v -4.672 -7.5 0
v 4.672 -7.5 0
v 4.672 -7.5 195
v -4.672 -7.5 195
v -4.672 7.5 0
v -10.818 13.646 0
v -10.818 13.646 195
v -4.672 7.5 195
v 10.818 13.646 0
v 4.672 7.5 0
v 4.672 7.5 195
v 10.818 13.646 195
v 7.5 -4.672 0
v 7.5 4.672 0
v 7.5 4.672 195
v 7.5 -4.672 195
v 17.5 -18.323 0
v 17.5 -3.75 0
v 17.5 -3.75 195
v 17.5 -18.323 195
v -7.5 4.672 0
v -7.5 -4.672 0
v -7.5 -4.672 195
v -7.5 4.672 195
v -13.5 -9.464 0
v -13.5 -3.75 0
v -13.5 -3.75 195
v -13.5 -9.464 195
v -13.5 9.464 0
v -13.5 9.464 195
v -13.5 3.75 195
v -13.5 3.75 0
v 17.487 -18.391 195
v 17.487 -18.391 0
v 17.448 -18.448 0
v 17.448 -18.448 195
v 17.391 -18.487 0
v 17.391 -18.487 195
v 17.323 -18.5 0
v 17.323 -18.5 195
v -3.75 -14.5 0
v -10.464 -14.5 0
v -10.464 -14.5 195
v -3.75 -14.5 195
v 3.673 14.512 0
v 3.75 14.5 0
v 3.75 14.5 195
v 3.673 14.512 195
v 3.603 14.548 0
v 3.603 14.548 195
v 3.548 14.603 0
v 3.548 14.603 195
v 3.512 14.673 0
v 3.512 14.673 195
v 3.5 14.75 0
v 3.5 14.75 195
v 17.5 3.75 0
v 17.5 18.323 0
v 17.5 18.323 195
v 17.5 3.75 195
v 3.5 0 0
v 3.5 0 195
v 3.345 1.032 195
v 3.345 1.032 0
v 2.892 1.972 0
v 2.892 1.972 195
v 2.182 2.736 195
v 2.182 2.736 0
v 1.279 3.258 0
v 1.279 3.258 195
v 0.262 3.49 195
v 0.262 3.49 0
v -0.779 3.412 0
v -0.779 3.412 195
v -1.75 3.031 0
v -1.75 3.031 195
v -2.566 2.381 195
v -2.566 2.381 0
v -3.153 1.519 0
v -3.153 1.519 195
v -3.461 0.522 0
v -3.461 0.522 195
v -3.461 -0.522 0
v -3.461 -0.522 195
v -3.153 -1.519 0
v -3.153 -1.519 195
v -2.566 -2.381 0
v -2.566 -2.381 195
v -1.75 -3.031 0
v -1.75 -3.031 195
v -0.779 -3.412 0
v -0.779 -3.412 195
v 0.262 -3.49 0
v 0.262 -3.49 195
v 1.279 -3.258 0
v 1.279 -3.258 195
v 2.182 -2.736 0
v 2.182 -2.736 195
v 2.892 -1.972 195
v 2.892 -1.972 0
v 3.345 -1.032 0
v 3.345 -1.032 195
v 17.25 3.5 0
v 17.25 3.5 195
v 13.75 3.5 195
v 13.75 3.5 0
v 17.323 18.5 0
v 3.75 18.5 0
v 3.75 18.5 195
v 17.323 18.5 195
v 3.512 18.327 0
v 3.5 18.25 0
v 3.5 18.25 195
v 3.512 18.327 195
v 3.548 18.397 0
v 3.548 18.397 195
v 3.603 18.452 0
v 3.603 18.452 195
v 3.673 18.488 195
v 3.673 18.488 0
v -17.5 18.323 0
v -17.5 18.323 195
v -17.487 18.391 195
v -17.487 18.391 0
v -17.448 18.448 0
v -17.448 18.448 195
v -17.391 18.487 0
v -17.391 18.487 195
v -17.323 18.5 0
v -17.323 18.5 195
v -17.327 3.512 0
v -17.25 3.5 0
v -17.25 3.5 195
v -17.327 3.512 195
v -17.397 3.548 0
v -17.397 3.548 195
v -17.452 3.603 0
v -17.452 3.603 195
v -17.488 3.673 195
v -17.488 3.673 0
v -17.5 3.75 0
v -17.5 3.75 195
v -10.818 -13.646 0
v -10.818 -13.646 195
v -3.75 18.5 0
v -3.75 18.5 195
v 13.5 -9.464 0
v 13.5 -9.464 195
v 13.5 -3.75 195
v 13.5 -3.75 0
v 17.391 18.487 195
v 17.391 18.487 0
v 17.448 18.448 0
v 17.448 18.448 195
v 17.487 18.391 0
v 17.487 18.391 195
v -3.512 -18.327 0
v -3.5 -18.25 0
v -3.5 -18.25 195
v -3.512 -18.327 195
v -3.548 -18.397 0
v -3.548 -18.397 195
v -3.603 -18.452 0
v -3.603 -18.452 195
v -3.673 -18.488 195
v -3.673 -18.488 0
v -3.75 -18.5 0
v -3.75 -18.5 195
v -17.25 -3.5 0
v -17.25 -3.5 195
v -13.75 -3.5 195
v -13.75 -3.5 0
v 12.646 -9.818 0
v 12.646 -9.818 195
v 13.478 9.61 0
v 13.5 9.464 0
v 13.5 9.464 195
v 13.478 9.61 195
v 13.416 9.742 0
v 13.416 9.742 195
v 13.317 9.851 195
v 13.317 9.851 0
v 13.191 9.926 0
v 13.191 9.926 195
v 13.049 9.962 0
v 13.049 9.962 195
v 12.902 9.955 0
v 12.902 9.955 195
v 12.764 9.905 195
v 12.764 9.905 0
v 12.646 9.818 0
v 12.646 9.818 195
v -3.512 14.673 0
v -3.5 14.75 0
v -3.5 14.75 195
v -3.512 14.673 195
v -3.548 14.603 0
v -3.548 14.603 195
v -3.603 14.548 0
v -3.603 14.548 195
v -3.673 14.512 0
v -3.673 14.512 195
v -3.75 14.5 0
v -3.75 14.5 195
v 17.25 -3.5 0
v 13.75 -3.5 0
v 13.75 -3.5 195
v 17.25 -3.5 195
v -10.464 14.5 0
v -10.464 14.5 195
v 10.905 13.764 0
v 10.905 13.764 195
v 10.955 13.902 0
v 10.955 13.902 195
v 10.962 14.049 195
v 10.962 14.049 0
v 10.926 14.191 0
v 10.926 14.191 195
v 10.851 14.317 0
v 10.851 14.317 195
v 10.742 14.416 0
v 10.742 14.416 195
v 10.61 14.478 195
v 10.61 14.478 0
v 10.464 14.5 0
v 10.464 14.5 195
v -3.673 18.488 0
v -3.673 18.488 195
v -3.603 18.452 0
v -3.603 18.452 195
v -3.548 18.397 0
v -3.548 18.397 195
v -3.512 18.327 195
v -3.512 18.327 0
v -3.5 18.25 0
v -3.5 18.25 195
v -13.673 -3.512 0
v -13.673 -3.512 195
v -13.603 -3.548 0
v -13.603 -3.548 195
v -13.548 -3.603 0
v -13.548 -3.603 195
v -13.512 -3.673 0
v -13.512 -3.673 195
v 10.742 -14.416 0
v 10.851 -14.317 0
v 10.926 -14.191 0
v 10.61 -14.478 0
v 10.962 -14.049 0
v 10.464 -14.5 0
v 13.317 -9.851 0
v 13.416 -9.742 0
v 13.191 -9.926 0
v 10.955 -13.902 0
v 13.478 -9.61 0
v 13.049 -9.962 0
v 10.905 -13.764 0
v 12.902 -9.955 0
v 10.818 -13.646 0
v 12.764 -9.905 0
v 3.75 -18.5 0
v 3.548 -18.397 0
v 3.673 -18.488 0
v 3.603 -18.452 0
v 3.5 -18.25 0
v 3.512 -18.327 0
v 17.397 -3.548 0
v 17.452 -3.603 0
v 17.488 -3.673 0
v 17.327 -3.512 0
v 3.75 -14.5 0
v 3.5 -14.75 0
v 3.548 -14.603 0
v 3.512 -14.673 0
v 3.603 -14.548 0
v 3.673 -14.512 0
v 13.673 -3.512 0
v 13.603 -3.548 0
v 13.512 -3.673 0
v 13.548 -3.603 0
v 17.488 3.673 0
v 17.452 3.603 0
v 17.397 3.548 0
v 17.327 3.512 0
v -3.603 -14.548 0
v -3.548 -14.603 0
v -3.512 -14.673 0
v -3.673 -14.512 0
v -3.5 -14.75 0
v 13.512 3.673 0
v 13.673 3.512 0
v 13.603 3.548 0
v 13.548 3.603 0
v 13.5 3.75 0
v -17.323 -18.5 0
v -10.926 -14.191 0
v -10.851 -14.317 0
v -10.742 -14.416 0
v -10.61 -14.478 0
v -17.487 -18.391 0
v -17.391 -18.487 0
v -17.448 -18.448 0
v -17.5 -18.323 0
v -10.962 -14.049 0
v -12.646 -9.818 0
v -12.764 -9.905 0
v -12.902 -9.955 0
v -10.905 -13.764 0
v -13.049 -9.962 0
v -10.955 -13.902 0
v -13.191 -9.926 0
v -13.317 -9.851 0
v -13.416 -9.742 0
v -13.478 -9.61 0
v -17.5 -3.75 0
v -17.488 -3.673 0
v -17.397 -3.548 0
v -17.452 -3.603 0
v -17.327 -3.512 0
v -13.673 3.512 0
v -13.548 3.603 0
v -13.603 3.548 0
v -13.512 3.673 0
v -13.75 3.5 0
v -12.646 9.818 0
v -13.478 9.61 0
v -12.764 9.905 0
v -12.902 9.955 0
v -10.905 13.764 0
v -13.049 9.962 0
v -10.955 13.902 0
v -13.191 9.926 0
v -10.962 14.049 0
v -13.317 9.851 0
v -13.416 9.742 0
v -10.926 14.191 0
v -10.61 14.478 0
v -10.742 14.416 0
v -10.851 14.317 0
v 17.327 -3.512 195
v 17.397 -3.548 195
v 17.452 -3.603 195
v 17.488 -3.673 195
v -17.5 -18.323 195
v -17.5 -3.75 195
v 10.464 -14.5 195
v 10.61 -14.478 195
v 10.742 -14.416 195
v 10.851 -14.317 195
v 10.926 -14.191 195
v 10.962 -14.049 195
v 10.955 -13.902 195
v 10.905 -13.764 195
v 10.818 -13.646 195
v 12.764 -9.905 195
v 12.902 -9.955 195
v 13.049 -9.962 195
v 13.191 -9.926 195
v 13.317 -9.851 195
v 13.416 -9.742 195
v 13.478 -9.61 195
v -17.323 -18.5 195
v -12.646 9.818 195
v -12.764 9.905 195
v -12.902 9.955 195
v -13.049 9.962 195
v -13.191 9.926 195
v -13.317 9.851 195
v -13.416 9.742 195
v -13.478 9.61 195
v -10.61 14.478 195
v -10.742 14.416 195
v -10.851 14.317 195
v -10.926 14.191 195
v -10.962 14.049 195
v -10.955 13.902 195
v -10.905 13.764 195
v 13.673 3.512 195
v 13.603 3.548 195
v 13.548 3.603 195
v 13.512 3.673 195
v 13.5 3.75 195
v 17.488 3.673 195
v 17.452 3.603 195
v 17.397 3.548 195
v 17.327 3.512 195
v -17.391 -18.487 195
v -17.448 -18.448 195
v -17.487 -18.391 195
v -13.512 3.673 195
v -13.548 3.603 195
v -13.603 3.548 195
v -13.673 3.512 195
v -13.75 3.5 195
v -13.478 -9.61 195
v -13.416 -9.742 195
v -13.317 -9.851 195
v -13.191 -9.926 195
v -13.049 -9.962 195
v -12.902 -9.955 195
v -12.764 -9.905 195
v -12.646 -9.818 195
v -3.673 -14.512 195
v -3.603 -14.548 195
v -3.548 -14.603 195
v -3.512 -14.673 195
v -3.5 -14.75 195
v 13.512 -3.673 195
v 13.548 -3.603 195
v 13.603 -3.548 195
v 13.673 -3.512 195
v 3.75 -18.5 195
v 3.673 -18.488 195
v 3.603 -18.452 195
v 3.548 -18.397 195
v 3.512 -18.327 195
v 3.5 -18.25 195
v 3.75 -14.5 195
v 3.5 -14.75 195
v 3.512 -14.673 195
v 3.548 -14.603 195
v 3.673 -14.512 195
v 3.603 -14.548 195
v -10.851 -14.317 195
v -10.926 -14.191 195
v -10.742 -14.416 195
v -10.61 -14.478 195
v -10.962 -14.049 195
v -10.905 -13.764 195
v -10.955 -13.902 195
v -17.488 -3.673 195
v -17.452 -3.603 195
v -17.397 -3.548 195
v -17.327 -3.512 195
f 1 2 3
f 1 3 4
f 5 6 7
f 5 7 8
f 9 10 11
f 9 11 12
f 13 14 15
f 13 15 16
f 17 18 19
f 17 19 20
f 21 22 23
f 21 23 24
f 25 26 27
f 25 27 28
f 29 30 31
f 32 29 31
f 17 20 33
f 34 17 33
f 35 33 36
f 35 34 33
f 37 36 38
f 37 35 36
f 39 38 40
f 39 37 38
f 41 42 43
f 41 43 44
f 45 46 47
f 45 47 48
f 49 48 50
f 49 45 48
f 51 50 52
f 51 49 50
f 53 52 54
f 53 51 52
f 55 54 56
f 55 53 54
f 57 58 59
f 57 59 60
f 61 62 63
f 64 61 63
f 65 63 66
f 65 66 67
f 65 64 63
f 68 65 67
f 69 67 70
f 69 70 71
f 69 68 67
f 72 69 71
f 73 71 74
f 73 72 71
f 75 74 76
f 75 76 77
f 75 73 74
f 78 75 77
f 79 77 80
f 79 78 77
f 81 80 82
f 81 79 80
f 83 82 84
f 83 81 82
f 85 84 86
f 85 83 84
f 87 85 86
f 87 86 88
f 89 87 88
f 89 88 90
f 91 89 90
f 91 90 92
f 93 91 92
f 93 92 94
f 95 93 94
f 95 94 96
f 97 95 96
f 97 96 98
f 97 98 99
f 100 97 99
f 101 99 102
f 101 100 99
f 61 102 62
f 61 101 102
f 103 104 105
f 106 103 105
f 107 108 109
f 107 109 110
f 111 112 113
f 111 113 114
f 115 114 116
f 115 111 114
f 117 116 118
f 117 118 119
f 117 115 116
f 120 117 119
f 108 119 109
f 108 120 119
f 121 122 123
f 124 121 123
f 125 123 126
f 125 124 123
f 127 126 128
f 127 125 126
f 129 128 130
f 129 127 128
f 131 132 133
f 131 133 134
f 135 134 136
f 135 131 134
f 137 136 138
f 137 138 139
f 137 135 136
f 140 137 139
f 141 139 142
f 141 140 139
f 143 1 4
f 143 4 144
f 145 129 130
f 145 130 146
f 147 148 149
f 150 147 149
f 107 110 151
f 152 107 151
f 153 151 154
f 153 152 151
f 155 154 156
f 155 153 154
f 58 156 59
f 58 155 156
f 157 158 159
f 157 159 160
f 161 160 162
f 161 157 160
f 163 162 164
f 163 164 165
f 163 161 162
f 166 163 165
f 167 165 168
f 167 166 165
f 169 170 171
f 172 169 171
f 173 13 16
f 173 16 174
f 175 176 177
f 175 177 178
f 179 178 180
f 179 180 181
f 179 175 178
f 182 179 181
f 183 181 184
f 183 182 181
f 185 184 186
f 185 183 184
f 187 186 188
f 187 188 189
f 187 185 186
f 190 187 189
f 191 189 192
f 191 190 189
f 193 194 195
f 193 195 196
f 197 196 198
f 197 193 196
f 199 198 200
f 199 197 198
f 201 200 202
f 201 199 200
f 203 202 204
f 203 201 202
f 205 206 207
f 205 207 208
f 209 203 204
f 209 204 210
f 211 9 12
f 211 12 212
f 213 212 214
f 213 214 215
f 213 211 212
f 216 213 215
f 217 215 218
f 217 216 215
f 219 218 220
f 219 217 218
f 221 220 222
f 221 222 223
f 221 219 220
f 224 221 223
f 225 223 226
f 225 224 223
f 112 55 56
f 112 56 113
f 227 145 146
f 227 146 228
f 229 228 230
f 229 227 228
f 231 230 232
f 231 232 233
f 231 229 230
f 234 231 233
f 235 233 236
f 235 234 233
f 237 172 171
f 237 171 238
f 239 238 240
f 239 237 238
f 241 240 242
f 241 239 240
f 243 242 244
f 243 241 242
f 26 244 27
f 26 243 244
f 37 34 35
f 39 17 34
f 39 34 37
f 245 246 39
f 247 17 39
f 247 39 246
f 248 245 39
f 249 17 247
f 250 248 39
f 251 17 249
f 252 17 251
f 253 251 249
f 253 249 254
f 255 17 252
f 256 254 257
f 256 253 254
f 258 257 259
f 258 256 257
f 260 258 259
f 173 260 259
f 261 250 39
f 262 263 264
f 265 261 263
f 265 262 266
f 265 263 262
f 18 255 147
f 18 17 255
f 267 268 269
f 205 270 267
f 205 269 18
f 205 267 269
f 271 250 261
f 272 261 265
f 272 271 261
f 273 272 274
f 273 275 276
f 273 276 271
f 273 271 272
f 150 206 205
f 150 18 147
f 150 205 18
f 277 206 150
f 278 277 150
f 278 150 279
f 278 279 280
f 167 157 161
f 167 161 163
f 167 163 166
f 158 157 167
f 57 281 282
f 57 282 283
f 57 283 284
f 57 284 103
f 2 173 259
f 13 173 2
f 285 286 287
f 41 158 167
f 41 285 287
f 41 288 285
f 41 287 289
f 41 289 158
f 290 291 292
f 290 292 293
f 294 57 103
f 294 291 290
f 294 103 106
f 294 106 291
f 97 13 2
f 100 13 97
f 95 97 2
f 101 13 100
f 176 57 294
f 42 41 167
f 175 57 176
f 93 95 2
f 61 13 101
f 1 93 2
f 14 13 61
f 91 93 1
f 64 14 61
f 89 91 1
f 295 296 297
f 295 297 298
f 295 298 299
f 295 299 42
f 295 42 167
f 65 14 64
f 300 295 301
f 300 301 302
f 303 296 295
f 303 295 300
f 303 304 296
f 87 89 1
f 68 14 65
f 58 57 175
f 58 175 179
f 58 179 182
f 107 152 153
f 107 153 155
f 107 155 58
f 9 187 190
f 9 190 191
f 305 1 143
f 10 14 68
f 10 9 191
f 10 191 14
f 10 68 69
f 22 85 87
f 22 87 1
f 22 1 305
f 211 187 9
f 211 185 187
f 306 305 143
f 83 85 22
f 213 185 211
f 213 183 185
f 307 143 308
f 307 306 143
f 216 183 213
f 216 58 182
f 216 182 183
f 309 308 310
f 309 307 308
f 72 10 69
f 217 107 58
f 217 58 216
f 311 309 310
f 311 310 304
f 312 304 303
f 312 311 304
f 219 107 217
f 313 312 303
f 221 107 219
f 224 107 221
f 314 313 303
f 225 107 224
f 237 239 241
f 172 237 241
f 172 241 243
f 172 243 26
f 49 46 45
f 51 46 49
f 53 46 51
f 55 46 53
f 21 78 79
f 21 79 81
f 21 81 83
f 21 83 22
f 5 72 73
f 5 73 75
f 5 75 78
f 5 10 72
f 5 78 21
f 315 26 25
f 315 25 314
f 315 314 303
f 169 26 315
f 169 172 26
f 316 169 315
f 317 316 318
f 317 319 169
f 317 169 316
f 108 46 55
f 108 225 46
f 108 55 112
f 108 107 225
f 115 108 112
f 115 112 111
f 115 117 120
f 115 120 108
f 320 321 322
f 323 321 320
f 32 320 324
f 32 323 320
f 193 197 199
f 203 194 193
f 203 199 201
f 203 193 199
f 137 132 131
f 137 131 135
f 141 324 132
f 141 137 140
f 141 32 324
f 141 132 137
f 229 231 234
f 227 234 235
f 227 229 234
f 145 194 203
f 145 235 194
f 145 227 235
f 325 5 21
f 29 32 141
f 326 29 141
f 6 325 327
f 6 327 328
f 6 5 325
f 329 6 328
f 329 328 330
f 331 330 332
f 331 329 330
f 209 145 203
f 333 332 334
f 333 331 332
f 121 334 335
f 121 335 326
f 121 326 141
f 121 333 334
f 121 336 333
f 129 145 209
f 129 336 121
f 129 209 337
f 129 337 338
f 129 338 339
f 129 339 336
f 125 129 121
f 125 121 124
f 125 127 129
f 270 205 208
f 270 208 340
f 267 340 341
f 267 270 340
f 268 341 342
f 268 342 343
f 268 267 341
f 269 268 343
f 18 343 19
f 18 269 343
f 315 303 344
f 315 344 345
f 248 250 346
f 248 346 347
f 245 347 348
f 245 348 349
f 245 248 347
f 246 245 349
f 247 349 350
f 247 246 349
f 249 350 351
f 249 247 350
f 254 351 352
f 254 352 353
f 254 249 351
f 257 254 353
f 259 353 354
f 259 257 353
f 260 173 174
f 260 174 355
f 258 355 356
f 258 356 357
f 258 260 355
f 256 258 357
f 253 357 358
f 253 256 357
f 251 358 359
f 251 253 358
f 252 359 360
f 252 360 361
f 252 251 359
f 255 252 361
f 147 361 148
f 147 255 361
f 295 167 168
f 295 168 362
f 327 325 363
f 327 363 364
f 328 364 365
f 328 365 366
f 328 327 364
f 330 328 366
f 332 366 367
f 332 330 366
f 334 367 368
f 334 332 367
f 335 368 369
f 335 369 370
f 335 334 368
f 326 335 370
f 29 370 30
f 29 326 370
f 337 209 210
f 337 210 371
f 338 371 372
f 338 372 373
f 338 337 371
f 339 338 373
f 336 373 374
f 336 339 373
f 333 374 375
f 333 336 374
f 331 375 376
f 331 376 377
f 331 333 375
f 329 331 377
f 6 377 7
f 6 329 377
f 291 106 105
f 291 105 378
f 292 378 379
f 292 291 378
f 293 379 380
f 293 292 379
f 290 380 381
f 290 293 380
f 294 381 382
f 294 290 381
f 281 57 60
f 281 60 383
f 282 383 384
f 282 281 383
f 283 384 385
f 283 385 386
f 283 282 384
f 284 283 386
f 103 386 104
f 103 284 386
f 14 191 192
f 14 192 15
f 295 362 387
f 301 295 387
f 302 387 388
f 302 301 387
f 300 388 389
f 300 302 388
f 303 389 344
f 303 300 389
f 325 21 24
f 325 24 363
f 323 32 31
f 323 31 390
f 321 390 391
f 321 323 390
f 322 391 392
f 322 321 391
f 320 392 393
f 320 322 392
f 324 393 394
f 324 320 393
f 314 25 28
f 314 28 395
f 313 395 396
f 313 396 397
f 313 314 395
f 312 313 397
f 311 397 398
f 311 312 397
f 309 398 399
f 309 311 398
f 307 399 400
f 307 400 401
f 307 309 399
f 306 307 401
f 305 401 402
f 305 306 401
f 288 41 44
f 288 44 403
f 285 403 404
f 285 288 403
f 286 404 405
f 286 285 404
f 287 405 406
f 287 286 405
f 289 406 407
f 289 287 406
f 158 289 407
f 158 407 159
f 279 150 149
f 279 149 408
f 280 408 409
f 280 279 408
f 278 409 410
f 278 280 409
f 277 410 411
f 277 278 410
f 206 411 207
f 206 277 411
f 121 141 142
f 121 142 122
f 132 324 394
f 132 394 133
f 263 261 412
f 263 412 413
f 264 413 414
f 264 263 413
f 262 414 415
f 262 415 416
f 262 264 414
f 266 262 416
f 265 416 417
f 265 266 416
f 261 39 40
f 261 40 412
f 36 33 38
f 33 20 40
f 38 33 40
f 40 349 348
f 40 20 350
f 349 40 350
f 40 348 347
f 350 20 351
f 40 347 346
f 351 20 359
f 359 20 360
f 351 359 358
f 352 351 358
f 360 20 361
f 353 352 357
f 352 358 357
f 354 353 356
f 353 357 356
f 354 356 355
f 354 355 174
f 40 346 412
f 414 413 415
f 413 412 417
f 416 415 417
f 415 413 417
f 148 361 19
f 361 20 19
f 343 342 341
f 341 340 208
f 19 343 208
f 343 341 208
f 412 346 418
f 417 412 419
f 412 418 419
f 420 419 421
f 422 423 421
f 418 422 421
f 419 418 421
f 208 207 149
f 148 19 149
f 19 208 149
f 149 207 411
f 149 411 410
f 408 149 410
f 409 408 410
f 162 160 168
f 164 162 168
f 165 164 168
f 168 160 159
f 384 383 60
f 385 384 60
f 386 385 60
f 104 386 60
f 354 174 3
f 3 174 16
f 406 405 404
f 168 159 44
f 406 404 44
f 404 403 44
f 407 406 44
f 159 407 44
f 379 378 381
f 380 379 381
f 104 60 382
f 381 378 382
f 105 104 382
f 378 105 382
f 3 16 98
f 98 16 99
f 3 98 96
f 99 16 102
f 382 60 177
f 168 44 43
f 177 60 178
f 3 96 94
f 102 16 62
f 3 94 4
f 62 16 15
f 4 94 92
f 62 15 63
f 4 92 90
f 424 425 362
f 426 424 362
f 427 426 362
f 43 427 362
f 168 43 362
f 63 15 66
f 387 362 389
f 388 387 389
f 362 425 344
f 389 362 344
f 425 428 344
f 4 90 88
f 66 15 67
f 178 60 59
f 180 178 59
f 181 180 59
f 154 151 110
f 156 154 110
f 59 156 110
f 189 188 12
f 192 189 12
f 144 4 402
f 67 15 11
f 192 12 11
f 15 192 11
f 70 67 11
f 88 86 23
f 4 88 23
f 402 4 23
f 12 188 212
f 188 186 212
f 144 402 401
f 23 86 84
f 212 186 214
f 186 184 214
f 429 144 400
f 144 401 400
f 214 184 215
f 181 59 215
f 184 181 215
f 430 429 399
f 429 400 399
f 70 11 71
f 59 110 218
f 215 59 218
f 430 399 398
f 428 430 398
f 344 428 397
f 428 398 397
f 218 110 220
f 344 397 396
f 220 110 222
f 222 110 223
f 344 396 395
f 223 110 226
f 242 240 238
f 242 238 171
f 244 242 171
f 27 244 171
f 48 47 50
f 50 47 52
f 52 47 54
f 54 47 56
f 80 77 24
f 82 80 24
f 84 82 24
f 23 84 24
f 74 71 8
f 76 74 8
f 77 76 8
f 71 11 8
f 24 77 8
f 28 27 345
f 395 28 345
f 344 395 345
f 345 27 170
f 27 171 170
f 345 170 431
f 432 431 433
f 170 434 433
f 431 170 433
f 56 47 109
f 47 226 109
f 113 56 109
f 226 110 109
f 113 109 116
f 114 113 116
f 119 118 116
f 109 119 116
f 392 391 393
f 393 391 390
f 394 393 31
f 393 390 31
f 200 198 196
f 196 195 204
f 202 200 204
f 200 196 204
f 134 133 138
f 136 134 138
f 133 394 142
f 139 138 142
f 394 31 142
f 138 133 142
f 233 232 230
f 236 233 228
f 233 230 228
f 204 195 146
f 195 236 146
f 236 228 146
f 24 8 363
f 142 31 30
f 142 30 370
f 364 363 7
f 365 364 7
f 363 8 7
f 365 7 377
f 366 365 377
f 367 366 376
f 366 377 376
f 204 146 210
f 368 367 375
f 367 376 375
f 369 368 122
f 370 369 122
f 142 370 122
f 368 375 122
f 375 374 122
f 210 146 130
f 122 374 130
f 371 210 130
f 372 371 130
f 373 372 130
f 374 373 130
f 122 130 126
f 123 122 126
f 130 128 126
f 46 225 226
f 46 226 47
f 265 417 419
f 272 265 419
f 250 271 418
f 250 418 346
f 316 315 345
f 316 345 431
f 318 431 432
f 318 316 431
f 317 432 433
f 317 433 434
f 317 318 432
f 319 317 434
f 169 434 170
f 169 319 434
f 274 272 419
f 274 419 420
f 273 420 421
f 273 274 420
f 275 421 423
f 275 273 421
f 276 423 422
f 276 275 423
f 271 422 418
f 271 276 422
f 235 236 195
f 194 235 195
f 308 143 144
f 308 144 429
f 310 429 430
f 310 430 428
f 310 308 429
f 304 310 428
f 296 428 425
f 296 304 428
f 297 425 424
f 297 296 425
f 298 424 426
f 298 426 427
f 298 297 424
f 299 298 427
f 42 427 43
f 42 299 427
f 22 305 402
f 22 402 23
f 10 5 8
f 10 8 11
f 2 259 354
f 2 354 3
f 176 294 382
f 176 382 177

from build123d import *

# Parameters (mm, degrees)
SKETCH1_R           = 3.5
BOSS_EXTRUDE1_DEPTH = 195


with BuildPart() as part:
    # Sketch1 → Boss-Extrude1 (new body)
    with BuildSketch(Plane.XY):
        with BuildLine():
            Line((-7.5, -4.671572875), (-7.5, 4.671572875))
            Line((-7.5, 4.671572875), (-12.646446609, 9.818019485))
            ThreePointArc((-12.646446609, 9.818019485), (-13.191341716, 9.92640586), (-13.5, 9.464466094))
            Line((-13.5, 9.464466094), (-13.5, 3.75))
            ThreePointArc((-13.5, 3.75), (-13.573223305, 3.573223305), (-13.75, 3.5))
            Line((-13.75, 3.5), (-17.25, 3.5))
            ThreePointArc((-17.25, 3.5), (-17.426776695, 3.573223305), (-17.5, 3.75))
            Line((-17.5, 3.75), (-17.5, 18.323223305))
            ThreePointArc((-17.5, 18.323223305), (-17.448223305, 18.448223305), (-17.323223305, 18.5))
            Line((-17.323223305, 18.5), (-3.75, 18.5))
            ThreePointArc((-3.75, 18.5), (-3.573223305, 18.426776695), (-3.5, 18.25))
            Line((-3.5, 18.25), (-3.5, 14.75))
            ThreePointArc((-3.5, 14.75), (-3.573223305, 14.573223305), (-3.75, 14.5))
            Line((-3.75, 14.5), (-10.464466094, 14.5))
            ThreePointArc((-10.464466094, 14.5), (-10.92640586, 14.191341716), (-10.818019485, 13.646446609))
            Line((-10.818019485, 13.646446609), (-4.671572875, 7.5))
            Line((-4.671572875, 7.5), (4.671572875, 7.5))
            Line((4.671572875, 7.5), (10.818019485, 13.646446609))
            ThreePointArc((10.818019485, 13.646446609), (10.92640586, 14.191341716), (10.464466094, 14.5))
            Line((10.464466094, 14.5), (3.75, 14.5))
            ThreePointArc((3.75, 14.5), (3.573223305, 14.573223305), (3.5, 14.75))
            Line((3.5, 14.75), (3.5, 18.25))
            ThreePointArc((3.5, 18.25), (3.573223305, 18.426776695), (3.75, 18.5))
            Line((3.75, 18.5), (17.323223305, 18.5))
            ThreePointArc((17.323223305, 18.5), (17.448223305, 18.448223305), (17.5, 18.323223305))
            Line((17.5, 18.323223305), (17.5, 3.75))
            ThreePointArc((17.5, 3.75), (17.426776695, 3.573223305), (17.25, 3.5))
            Line((17.25, 3.5), (13.75, 3.5))
            ThreePointArc((13.75, 3.5), (13.573223305, 3.573223305), (13.5, 3.75))
            Line((13.5, 3.75), (13.5, 9.464466094))
            ThreePointArc((13.5, 9.464466094), (13.191341716, 9.92640586), (12.646446609, 9.818019485))
            Line((12.646446609, 9.818019485), (7.5, 4.671572875))
            Line((7.5, 4.671572875), (7.5, -4.671572875))
            Line((7.5, -4.671572875), (12.646446609, -9.818019485))
            ThreePointArc((12.646446609, -9.818019485), (13.191341716, -9.92640586), (13.5, -9.464466094))
            Line((13.5, -9.464466094), (13.5, -3.75))
            ThreePointArc((13.5, -3.75), (13.573223305, -3.573223305), (13.75, -3.5))
            Line((13.75, -3.5), (17.25, -3.5))
            ThreePointArc((17.25, -3.5), (17.426776695, -3.573223305), (17.5, -3.75))
            Line((17.5, -3.75), (17.5, -18.323223305))
            ThreePointArc((17.5, -18.323223305), (17.448223305, -18.448223305), (17.323223305, -18.5))
            Line((17.323223305, -18.5), (3.75, -18.5))
            ThreePointArc((3.75, -18.5), (3.573223305, -18.426776695), (3.5, -18.25))
            Line((3.5, -18.25), (3.5, -14.75))
            ThreePointArc((3.5, -14.75), (3.573223305, -14.573223305), (3.75, -14.5))
            Line((3.75, -14.5), (10.464466094, -14.5))
            ThreePointArc((10.464466094, -14.5), (10.92640586, -14.191341716), (10.818019485, -13.646446609))
            Line((10.818019485, -13.646446609), (4.671572875, -7.5))
            Line((4.671572875, -7.5), (-4.671572875, -7.5))
            Line((-4.671572875, -7.5), (-10.818019485, -13.646446609))
            ThreePointArc((-10.818019485, -13.646446609), (-10.92640586, -14.191341716), (-10.464466094, -14.5))
            Line((-10.464466094, -14.5), (-3.75, -14.5))
            ThreePointArc((-3.75, -14.5), (-3.573223305, -14.573223305), (-3.5, -14.75))
            Line((-3.5, -14.75), (-3.5, -18.25))
            ThreePointArc((-3.5, -18.25), (-3.573223305, -18.426776695), (-3.75, -18.5))
            Line((-3.75, -18.5), (-17.323223305, -18.5))
            ThreePointArc((-17.323223305, -18.5), (-17.448223305, -18.448223305), (-17.5, -18.323223305))
            Line((-17.5, -18.323223305), (-17.5, -3.75))
            ThreePointArc((-17.5, -3.75), (-17.426776695, -3.573223305), (-17.25, -3.5))
            Line((-17.25, -3.5), (-13.75, -3.5))
            ThreePointArc((-13.75, -3.5), (-13.573223305, -3.573223305), (-13.5, -3.75))
            Line((-13.5, -3.75), (-13.5, -9.464466094))
            ThreePointArc((-13.5, -9.464466094), (-13.191341716, -9.92640586), (-12.646446609, -9.818019485))
            Line((-12.646446609, -9.818019485), (-7.5, -4.671572875))
        make_face()
        Circle(SKETCH1_R, mode=Mode.SUBTRACT)
    extrude(amount=BOSS_EXTRUDE1_DEPTH)


solid = part.part
